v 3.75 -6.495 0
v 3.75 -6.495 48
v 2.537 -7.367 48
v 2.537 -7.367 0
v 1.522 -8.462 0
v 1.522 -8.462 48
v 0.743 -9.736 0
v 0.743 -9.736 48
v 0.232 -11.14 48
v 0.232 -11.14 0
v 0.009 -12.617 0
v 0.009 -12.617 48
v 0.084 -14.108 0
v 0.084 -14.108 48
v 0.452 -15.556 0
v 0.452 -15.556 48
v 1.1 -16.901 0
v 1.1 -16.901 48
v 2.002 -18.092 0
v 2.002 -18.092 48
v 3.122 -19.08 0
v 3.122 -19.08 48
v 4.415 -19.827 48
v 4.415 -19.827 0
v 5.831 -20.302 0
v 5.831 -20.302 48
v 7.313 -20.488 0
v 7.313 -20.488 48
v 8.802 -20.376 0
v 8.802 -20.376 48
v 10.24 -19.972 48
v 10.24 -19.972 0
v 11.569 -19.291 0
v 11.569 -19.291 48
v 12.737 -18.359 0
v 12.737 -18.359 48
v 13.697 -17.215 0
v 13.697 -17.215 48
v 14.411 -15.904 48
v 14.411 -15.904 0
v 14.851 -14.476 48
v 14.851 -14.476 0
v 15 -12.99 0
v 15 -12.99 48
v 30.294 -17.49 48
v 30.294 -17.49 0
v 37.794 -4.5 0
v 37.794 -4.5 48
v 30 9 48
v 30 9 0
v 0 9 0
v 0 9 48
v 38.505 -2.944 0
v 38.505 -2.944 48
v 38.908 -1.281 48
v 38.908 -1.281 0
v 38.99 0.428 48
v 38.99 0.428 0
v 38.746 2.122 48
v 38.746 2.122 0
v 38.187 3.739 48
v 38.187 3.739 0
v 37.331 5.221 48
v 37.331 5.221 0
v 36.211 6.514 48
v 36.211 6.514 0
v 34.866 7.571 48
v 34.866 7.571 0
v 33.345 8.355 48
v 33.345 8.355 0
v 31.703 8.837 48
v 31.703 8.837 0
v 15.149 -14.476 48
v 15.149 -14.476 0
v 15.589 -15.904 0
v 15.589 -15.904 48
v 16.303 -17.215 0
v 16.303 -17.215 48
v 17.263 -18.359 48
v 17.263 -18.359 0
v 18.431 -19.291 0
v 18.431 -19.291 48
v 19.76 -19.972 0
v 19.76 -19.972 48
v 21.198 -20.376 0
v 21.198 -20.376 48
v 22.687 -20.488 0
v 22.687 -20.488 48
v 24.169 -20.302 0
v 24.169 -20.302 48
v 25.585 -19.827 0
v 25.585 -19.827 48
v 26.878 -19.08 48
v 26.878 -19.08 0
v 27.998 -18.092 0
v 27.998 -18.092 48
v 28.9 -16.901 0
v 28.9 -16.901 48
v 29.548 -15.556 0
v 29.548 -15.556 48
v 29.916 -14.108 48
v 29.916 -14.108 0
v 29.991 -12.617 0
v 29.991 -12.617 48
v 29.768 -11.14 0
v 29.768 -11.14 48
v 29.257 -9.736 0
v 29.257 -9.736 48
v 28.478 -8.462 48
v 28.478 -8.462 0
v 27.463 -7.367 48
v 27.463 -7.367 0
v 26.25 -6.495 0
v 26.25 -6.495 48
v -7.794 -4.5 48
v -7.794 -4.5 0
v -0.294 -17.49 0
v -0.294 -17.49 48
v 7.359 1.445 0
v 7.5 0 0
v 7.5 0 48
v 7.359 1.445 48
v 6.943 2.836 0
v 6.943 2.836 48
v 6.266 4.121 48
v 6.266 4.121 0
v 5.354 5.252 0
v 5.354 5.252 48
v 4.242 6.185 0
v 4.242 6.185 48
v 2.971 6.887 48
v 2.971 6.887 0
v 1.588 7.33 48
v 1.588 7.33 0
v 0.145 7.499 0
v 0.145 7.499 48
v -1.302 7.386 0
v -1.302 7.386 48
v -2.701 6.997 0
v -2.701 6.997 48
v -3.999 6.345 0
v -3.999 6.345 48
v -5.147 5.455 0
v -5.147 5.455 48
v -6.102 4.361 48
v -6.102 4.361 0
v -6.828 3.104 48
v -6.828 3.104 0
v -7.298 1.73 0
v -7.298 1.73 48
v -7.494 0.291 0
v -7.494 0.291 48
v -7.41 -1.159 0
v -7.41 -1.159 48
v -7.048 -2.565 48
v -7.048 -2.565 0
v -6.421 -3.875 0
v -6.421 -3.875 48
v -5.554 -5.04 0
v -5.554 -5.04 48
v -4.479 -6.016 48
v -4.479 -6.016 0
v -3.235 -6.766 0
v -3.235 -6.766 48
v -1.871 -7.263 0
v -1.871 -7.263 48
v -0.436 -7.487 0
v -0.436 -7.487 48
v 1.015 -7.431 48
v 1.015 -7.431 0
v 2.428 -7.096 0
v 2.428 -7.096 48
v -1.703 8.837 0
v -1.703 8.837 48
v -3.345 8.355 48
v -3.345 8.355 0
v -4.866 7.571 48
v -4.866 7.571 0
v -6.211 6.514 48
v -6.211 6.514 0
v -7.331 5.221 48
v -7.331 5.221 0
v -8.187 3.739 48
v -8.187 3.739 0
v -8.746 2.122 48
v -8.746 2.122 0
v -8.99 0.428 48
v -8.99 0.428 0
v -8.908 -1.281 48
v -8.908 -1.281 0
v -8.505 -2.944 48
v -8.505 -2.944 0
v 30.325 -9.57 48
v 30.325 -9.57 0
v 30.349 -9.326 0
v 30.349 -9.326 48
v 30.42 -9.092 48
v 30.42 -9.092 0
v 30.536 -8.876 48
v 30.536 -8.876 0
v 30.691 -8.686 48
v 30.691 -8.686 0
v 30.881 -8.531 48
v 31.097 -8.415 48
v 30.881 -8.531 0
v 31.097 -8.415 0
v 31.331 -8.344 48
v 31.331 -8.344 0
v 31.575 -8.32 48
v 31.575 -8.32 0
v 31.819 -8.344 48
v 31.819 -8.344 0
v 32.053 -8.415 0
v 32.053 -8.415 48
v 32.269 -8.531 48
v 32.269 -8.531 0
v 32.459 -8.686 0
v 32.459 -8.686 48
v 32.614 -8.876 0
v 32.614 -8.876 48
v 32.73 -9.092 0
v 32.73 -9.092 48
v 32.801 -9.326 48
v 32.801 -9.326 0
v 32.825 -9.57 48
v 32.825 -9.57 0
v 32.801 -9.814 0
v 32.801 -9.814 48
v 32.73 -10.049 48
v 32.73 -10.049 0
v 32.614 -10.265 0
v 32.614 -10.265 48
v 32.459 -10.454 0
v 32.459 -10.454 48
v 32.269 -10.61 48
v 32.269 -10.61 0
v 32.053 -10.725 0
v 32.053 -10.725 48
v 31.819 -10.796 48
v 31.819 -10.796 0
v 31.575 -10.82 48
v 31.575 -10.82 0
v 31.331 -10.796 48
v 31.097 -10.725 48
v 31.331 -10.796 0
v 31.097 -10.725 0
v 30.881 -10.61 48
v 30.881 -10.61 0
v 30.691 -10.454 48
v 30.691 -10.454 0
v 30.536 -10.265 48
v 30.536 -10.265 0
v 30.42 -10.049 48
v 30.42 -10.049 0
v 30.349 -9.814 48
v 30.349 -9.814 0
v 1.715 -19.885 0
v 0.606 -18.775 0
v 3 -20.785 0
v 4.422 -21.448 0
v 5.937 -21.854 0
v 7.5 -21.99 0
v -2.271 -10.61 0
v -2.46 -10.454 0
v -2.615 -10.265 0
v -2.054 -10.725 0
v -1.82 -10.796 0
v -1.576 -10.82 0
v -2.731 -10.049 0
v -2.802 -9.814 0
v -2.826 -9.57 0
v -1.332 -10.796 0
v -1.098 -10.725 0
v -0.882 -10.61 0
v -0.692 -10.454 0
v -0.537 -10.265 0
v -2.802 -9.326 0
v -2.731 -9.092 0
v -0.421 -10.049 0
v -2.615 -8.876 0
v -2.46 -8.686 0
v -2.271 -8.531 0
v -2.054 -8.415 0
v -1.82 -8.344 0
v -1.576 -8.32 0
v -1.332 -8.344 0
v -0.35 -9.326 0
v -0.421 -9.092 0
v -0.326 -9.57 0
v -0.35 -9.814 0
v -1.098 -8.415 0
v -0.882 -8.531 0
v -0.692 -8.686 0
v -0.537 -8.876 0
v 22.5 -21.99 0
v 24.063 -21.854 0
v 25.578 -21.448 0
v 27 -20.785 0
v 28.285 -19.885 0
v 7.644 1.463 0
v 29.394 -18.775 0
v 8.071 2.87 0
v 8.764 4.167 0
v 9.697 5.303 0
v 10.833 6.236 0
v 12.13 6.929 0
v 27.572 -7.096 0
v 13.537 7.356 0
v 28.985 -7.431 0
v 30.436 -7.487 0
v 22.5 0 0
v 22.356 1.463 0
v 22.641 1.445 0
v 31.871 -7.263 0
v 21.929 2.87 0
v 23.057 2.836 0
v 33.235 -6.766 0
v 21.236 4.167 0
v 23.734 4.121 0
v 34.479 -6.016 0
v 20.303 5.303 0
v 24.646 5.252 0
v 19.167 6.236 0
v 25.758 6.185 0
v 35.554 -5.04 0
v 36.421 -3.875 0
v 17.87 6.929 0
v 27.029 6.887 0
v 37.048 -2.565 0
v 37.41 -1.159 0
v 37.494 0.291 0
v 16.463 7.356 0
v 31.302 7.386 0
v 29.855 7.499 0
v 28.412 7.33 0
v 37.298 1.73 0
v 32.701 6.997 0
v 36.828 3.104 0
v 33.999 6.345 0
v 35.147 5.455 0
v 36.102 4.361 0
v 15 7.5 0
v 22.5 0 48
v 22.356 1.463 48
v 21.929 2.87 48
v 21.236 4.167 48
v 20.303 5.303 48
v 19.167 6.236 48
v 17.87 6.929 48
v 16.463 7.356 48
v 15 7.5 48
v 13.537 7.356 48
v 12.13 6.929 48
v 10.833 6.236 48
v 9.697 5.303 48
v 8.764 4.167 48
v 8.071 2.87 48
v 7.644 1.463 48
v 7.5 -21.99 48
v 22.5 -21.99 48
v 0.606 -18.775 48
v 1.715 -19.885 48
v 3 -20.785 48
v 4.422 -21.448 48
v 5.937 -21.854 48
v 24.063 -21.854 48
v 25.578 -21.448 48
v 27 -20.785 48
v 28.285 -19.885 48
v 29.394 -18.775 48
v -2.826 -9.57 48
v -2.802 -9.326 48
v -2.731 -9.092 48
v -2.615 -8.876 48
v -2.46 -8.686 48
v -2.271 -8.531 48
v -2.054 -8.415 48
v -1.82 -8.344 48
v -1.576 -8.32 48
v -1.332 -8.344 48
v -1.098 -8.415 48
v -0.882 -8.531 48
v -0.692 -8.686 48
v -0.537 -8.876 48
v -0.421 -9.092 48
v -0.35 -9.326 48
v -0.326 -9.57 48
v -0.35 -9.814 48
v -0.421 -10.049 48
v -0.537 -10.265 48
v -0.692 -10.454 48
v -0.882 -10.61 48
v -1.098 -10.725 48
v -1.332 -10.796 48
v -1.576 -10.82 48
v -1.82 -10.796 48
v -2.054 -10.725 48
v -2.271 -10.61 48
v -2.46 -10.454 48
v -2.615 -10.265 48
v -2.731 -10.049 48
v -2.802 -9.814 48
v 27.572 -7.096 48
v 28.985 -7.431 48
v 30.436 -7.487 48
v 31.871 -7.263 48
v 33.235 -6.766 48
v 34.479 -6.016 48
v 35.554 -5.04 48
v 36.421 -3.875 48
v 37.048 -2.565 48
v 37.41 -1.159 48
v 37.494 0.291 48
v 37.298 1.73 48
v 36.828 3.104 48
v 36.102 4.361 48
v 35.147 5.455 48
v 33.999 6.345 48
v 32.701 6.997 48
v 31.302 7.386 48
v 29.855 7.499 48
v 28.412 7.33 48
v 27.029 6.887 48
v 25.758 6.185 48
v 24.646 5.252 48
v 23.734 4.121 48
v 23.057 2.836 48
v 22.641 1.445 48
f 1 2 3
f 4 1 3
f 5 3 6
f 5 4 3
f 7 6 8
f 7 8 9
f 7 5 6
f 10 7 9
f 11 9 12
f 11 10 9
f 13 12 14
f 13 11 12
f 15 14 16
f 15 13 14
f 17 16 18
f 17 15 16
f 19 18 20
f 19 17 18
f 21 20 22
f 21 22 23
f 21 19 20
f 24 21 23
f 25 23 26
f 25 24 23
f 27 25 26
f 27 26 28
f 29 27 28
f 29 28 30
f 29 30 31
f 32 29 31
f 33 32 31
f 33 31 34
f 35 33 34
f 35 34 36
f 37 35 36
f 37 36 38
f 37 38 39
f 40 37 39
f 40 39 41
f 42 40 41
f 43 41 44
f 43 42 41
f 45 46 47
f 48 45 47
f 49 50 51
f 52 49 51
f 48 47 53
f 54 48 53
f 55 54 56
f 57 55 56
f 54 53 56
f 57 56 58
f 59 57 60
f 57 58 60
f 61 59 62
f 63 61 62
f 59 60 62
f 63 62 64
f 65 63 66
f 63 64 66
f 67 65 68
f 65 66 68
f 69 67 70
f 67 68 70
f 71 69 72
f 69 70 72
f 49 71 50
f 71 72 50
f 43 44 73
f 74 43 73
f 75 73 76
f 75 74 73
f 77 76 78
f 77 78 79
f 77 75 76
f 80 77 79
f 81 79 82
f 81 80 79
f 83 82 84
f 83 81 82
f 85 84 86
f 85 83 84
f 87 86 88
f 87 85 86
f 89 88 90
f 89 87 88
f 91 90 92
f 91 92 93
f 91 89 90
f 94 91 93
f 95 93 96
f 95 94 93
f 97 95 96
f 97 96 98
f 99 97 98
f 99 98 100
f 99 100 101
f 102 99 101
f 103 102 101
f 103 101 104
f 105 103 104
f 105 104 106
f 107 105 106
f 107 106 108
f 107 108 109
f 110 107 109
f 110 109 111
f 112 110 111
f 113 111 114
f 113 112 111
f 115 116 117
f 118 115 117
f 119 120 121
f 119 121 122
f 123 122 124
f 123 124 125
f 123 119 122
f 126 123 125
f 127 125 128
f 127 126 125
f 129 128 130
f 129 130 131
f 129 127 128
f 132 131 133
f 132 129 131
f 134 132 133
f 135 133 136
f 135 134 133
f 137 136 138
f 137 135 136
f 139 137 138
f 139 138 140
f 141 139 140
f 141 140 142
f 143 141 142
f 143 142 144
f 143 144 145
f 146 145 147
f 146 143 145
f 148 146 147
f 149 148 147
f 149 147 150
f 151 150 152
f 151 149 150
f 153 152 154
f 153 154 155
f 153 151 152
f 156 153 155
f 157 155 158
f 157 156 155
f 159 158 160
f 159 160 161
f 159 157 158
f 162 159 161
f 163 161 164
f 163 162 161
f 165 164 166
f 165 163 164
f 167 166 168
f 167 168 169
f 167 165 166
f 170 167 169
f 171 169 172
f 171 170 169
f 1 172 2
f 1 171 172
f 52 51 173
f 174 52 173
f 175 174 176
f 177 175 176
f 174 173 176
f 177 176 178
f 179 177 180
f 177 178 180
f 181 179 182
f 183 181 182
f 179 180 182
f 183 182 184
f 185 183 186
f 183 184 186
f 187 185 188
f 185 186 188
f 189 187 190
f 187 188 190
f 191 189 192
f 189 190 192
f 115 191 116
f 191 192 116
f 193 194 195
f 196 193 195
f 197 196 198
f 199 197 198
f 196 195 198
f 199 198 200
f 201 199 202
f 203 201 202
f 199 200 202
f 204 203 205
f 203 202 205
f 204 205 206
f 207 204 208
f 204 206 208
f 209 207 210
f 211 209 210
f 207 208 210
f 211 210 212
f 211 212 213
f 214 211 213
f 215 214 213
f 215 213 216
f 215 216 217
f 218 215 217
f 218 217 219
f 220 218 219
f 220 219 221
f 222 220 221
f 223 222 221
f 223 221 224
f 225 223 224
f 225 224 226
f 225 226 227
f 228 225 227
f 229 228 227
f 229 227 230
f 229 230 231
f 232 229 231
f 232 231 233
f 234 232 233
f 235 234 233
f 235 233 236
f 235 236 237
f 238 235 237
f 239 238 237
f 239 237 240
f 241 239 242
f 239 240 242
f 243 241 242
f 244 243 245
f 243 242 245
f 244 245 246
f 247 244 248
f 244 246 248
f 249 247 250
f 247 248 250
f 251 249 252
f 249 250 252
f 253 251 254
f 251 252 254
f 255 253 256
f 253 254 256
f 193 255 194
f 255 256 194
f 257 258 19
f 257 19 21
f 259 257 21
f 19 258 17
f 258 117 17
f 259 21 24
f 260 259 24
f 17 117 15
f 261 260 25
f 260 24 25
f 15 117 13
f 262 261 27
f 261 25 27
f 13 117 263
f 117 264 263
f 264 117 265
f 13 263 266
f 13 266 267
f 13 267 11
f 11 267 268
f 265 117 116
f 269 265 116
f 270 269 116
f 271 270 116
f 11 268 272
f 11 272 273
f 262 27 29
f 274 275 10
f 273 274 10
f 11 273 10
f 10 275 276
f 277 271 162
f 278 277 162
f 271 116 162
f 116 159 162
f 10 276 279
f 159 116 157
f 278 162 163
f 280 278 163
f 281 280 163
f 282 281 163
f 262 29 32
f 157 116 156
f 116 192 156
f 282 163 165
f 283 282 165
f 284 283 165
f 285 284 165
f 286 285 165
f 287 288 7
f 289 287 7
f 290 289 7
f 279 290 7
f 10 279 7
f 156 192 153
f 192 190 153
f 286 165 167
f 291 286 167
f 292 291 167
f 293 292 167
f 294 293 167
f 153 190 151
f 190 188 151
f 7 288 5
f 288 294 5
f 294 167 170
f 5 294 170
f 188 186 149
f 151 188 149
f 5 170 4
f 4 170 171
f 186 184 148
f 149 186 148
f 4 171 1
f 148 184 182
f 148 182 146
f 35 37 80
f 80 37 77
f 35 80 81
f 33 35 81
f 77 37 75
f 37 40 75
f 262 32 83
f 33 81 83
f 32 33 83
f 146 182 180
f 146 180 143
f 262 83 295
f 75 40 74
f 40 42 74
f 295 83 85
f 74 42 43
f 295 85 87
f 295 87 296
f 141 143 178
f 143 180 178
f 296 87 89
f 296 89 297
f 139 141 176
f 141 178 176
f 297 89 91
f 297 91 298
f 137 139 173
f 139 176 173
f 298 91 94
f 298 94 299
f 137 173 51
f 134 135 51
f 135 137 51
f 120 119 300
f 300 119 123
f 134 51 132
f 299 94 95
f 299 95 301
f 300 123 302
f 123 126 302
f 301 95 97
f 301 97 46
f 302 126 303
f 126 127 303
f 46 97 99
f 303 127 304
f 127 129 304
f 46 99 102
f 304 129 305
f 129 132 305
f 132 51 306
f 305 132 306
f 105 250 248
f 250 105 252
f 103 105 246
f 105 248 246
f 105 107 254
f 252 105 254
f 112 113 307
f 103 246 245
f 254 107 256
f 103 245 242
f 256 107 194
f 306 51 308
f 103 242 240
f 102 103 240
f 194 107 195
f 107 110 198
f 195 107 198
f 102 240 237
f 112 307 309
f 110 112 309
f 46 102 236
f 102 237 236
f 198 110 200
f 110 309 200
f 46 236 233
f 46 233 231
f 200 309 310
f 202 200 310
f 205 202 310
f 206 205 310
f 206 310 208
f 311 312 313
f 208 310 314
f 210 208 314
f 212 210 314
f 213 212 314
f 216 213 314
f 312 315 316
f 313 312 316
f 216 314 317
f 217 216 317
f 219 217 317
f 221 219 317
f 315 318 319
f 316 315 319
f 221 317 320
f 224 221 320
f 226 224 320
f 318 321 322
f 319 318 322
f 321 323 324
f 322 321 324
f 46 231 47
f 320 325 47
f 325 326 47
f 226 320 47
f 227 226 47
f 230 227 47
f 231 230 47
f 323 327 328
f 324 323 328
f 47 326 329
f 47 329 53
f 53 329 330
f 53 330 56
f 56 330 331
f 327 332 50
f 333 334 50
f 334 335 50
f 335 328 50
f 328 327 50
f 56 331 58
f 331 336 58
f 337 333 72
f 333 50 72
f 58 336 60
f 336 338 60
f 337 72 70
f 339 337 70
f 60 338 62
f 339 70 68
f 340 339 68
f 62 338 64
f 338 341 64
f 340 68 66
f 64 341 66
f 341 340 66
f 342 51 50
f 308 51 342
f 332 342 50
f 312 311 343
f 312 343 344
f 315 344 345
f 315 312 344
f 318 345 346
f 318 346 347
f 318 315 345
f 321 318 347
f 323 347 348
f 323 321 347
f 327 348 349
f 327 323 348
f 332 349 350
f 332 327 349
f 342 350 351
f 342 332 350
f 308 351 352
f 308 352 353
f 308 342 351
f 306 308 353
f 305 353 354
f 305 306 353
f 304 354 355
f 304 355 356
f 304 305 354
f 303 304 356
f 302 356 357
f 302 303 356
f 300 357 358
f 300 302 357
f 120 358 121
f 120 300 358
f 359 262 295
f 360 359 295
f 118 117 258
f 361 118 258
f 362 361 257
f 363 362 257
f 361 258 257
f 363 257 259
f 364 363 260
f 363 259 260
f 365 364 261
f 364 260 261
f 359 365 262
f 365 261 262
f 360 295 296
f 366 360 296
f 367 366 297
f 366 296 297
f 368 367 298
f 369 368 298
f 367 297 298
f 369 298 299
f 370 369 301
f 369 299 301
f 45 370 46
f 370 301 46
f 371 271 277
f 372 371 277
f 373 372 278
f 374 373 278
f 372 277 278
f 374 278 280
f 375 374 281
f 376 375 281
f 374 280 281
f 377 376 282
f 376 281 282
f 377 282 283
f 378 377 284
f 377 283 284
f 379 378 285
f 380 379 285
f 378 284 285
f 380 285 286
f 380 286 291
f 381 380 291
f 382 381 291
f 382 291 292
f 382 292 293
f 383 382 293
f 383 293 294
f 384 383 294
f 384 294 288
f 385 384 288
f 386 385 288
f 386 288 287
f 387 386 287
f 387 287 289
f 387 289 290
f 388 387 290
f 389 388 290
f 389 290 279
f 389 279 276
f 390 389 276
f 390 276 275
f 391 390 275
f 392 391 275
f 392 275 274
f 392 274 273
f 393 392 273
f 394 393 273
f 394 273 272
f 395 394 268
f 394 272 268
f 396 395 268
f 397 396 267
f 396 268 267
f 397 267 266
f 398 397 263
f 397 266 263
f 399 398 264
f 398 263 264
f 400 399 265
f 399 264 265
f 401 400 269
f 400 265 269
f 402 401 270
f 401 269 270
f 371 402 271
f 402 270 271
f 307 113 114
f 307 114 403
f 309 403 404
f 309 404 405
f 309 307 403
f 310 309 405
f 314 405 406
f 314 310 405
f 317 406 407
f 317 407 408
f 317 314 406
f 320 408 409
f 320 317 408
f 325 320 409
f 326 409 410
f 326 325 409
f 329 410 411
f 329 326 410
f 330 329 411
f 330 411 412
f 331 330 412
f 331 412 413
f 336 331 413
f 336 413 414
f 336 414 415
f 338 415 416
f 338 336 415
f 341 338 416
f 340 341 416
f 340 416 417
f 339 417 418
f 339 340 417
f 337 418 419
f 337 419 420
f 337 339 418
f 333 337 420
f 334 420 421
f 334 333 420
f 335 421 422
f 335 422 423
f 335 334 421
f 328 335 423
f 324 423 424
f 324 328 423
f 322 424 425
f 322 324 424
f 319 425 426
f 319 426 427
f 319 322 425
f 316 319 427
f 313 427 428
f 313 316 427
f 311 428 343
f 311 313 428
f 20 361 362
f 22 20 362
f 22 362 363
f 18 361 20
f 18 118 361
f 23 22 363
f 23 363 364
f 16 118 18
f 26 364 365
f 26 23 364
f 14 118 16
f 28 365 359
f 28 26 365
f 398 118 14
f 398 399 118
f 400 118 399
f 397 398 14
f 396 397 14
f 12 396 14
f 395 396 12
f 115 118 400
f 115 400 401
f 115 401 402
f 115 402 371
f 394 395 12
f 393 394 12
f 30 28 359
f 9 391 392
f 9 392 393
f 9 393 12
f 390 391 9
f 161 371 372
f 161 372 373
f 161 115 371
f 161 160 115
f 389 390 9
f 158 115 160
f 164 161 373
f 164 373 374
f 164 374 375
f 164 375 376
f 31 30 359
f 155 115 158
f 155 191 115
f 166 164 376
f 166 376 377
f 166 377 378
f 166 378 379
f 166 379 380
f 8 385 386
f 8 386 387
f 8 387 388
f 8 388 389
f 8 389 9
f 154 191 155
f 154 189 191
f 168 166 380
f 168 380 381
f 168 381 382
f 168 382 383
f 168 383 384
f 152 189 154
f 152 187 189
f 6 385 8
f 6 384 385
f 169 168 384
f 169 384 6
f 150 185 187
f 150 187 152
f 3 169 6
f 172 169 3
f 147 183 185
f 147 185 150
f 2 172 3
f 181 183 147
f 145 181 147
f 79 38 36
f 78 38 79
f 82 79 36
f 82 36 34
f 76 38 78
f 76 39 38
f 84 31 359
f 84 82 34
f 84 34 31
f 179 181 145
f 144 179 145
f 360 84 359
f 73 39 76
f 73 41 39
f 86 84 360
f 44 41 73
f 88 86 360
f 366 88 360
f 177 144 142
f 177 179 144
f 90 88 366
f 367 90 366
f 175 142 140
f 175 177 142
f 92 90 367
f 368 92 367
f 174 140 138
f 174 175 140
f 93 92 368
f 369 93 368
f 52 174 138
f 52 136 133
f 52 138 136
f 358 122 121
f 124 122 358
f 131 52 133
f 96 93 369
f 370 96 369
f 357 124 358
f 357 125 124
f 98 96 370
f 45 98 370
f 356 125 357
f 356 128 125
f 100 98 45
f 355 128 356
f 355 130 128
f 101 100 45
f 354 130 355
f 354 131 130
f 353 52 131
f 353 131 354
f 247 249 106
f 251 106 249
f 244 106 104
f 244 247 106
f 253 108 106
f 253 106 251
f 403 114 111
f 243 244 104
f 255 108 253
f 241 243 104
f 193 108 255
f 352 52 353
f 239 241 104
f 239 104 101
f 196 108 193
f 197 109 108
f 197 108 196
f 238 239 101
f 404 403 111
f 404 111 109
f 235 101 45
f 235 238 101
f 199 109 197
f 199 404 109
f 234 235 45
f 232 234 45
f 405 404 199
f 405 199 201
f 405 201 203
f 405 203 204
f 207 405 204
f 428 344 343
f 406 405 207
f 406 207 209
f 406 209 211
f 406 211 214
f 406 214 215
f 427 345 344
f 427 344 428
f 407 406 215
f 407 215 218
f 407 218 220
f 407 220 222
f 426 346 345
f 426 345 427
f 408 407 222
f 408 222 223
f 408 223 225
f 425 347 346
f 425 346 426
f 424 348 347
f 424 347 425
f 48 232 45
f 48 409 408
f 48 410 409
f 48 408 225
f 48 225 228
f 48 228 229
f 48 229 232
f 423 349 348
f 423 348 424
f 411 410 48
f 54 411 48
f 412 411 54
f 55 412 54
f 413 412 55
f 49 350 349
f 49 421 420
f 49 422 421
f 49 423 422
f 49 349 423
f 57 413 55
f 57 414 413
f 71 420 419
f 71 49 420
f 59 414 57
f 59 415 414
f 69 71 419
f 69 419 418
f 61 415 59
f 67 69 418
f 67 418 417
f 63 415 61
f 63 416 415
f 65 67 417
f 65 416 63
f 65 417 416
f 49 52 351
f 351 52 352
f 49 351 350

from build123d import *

# Parameters (mm, degrees)
BOSS_EXTRUDE1_DEPTH = 48
SKETCH2_R           = 1.25
CUT_EXTRUDE1_DEPTH  = 66.639750601


with BuildPart() as part:
    # Sketch1 → Boss-Extrude1 (new body)
    with BuildSketch(Plane.XY):
        with BuildLine():
            Line((7.5, -21.990381057), (22.5, -21.990381057))
            ThreePointArc((22.5, -21.990381057), (27, -20.784609691), (30.294228634, -17.490381057))
            Line((30.294228634, -17.490381057), (37.794228634, -4.5))
            ThreePointArc((37.794228634, -4.5), (37.794228634, 4.5), (30, 9))
            Line((30, 9), (0, 9))
            ThreePointArc((0, 9), (-7.794228634, 4.5), (-7.794228634, -4.5))
            Line((-7.794228634, -4.5), (-0.294228634, -17.490381057))
            ThreePointArc((-0.294228634, -17.490381057), (3, -20.784609691), (7.5, -21.990381057))
        make_face()
        with BuildLine():
            ThreePointArc((3.75, -6.495190528), (3.75, -19.485571585), (15, -12.990381057))
            ThreePointArc((15, -12.990381057), (26.25, -19.485571585), (26.25, -6.495190528))
            ThreePointArc((26.25, -6.495190528), (36.495190528, 3.75), (22.5, 0))
            ThreePointArc((22.5, 0), (15, 7.5), (7.5, 0))
            ThreePointArc((7.5, 0), (-6.495190528, 3.75), (3.75, -6.495190528))
        make_face(mode=Mode.SUBTRACT)
    extrude(amount=BOSS_EXTRUDE1_DEPTH)

    # Sketch2 → Cut-Extrude1 (cut, through all)
    with BuildSketch(Plane(origin=(0, 0, 0), x_dir=(-1, 0, 0), z_dir=(0, 0, -1))):
        with Locations((1.576056233, -9.570190528)):
            Circle(SKETCH2_R)
        with Locations((-31.574981029, -9.570190528)):
            Circle(SKETCH2_R)
    extrude(amount=-CUT_EXTRUDE1_DEPTH, mode=Mode.SUBTRACT)


solid = part.part
